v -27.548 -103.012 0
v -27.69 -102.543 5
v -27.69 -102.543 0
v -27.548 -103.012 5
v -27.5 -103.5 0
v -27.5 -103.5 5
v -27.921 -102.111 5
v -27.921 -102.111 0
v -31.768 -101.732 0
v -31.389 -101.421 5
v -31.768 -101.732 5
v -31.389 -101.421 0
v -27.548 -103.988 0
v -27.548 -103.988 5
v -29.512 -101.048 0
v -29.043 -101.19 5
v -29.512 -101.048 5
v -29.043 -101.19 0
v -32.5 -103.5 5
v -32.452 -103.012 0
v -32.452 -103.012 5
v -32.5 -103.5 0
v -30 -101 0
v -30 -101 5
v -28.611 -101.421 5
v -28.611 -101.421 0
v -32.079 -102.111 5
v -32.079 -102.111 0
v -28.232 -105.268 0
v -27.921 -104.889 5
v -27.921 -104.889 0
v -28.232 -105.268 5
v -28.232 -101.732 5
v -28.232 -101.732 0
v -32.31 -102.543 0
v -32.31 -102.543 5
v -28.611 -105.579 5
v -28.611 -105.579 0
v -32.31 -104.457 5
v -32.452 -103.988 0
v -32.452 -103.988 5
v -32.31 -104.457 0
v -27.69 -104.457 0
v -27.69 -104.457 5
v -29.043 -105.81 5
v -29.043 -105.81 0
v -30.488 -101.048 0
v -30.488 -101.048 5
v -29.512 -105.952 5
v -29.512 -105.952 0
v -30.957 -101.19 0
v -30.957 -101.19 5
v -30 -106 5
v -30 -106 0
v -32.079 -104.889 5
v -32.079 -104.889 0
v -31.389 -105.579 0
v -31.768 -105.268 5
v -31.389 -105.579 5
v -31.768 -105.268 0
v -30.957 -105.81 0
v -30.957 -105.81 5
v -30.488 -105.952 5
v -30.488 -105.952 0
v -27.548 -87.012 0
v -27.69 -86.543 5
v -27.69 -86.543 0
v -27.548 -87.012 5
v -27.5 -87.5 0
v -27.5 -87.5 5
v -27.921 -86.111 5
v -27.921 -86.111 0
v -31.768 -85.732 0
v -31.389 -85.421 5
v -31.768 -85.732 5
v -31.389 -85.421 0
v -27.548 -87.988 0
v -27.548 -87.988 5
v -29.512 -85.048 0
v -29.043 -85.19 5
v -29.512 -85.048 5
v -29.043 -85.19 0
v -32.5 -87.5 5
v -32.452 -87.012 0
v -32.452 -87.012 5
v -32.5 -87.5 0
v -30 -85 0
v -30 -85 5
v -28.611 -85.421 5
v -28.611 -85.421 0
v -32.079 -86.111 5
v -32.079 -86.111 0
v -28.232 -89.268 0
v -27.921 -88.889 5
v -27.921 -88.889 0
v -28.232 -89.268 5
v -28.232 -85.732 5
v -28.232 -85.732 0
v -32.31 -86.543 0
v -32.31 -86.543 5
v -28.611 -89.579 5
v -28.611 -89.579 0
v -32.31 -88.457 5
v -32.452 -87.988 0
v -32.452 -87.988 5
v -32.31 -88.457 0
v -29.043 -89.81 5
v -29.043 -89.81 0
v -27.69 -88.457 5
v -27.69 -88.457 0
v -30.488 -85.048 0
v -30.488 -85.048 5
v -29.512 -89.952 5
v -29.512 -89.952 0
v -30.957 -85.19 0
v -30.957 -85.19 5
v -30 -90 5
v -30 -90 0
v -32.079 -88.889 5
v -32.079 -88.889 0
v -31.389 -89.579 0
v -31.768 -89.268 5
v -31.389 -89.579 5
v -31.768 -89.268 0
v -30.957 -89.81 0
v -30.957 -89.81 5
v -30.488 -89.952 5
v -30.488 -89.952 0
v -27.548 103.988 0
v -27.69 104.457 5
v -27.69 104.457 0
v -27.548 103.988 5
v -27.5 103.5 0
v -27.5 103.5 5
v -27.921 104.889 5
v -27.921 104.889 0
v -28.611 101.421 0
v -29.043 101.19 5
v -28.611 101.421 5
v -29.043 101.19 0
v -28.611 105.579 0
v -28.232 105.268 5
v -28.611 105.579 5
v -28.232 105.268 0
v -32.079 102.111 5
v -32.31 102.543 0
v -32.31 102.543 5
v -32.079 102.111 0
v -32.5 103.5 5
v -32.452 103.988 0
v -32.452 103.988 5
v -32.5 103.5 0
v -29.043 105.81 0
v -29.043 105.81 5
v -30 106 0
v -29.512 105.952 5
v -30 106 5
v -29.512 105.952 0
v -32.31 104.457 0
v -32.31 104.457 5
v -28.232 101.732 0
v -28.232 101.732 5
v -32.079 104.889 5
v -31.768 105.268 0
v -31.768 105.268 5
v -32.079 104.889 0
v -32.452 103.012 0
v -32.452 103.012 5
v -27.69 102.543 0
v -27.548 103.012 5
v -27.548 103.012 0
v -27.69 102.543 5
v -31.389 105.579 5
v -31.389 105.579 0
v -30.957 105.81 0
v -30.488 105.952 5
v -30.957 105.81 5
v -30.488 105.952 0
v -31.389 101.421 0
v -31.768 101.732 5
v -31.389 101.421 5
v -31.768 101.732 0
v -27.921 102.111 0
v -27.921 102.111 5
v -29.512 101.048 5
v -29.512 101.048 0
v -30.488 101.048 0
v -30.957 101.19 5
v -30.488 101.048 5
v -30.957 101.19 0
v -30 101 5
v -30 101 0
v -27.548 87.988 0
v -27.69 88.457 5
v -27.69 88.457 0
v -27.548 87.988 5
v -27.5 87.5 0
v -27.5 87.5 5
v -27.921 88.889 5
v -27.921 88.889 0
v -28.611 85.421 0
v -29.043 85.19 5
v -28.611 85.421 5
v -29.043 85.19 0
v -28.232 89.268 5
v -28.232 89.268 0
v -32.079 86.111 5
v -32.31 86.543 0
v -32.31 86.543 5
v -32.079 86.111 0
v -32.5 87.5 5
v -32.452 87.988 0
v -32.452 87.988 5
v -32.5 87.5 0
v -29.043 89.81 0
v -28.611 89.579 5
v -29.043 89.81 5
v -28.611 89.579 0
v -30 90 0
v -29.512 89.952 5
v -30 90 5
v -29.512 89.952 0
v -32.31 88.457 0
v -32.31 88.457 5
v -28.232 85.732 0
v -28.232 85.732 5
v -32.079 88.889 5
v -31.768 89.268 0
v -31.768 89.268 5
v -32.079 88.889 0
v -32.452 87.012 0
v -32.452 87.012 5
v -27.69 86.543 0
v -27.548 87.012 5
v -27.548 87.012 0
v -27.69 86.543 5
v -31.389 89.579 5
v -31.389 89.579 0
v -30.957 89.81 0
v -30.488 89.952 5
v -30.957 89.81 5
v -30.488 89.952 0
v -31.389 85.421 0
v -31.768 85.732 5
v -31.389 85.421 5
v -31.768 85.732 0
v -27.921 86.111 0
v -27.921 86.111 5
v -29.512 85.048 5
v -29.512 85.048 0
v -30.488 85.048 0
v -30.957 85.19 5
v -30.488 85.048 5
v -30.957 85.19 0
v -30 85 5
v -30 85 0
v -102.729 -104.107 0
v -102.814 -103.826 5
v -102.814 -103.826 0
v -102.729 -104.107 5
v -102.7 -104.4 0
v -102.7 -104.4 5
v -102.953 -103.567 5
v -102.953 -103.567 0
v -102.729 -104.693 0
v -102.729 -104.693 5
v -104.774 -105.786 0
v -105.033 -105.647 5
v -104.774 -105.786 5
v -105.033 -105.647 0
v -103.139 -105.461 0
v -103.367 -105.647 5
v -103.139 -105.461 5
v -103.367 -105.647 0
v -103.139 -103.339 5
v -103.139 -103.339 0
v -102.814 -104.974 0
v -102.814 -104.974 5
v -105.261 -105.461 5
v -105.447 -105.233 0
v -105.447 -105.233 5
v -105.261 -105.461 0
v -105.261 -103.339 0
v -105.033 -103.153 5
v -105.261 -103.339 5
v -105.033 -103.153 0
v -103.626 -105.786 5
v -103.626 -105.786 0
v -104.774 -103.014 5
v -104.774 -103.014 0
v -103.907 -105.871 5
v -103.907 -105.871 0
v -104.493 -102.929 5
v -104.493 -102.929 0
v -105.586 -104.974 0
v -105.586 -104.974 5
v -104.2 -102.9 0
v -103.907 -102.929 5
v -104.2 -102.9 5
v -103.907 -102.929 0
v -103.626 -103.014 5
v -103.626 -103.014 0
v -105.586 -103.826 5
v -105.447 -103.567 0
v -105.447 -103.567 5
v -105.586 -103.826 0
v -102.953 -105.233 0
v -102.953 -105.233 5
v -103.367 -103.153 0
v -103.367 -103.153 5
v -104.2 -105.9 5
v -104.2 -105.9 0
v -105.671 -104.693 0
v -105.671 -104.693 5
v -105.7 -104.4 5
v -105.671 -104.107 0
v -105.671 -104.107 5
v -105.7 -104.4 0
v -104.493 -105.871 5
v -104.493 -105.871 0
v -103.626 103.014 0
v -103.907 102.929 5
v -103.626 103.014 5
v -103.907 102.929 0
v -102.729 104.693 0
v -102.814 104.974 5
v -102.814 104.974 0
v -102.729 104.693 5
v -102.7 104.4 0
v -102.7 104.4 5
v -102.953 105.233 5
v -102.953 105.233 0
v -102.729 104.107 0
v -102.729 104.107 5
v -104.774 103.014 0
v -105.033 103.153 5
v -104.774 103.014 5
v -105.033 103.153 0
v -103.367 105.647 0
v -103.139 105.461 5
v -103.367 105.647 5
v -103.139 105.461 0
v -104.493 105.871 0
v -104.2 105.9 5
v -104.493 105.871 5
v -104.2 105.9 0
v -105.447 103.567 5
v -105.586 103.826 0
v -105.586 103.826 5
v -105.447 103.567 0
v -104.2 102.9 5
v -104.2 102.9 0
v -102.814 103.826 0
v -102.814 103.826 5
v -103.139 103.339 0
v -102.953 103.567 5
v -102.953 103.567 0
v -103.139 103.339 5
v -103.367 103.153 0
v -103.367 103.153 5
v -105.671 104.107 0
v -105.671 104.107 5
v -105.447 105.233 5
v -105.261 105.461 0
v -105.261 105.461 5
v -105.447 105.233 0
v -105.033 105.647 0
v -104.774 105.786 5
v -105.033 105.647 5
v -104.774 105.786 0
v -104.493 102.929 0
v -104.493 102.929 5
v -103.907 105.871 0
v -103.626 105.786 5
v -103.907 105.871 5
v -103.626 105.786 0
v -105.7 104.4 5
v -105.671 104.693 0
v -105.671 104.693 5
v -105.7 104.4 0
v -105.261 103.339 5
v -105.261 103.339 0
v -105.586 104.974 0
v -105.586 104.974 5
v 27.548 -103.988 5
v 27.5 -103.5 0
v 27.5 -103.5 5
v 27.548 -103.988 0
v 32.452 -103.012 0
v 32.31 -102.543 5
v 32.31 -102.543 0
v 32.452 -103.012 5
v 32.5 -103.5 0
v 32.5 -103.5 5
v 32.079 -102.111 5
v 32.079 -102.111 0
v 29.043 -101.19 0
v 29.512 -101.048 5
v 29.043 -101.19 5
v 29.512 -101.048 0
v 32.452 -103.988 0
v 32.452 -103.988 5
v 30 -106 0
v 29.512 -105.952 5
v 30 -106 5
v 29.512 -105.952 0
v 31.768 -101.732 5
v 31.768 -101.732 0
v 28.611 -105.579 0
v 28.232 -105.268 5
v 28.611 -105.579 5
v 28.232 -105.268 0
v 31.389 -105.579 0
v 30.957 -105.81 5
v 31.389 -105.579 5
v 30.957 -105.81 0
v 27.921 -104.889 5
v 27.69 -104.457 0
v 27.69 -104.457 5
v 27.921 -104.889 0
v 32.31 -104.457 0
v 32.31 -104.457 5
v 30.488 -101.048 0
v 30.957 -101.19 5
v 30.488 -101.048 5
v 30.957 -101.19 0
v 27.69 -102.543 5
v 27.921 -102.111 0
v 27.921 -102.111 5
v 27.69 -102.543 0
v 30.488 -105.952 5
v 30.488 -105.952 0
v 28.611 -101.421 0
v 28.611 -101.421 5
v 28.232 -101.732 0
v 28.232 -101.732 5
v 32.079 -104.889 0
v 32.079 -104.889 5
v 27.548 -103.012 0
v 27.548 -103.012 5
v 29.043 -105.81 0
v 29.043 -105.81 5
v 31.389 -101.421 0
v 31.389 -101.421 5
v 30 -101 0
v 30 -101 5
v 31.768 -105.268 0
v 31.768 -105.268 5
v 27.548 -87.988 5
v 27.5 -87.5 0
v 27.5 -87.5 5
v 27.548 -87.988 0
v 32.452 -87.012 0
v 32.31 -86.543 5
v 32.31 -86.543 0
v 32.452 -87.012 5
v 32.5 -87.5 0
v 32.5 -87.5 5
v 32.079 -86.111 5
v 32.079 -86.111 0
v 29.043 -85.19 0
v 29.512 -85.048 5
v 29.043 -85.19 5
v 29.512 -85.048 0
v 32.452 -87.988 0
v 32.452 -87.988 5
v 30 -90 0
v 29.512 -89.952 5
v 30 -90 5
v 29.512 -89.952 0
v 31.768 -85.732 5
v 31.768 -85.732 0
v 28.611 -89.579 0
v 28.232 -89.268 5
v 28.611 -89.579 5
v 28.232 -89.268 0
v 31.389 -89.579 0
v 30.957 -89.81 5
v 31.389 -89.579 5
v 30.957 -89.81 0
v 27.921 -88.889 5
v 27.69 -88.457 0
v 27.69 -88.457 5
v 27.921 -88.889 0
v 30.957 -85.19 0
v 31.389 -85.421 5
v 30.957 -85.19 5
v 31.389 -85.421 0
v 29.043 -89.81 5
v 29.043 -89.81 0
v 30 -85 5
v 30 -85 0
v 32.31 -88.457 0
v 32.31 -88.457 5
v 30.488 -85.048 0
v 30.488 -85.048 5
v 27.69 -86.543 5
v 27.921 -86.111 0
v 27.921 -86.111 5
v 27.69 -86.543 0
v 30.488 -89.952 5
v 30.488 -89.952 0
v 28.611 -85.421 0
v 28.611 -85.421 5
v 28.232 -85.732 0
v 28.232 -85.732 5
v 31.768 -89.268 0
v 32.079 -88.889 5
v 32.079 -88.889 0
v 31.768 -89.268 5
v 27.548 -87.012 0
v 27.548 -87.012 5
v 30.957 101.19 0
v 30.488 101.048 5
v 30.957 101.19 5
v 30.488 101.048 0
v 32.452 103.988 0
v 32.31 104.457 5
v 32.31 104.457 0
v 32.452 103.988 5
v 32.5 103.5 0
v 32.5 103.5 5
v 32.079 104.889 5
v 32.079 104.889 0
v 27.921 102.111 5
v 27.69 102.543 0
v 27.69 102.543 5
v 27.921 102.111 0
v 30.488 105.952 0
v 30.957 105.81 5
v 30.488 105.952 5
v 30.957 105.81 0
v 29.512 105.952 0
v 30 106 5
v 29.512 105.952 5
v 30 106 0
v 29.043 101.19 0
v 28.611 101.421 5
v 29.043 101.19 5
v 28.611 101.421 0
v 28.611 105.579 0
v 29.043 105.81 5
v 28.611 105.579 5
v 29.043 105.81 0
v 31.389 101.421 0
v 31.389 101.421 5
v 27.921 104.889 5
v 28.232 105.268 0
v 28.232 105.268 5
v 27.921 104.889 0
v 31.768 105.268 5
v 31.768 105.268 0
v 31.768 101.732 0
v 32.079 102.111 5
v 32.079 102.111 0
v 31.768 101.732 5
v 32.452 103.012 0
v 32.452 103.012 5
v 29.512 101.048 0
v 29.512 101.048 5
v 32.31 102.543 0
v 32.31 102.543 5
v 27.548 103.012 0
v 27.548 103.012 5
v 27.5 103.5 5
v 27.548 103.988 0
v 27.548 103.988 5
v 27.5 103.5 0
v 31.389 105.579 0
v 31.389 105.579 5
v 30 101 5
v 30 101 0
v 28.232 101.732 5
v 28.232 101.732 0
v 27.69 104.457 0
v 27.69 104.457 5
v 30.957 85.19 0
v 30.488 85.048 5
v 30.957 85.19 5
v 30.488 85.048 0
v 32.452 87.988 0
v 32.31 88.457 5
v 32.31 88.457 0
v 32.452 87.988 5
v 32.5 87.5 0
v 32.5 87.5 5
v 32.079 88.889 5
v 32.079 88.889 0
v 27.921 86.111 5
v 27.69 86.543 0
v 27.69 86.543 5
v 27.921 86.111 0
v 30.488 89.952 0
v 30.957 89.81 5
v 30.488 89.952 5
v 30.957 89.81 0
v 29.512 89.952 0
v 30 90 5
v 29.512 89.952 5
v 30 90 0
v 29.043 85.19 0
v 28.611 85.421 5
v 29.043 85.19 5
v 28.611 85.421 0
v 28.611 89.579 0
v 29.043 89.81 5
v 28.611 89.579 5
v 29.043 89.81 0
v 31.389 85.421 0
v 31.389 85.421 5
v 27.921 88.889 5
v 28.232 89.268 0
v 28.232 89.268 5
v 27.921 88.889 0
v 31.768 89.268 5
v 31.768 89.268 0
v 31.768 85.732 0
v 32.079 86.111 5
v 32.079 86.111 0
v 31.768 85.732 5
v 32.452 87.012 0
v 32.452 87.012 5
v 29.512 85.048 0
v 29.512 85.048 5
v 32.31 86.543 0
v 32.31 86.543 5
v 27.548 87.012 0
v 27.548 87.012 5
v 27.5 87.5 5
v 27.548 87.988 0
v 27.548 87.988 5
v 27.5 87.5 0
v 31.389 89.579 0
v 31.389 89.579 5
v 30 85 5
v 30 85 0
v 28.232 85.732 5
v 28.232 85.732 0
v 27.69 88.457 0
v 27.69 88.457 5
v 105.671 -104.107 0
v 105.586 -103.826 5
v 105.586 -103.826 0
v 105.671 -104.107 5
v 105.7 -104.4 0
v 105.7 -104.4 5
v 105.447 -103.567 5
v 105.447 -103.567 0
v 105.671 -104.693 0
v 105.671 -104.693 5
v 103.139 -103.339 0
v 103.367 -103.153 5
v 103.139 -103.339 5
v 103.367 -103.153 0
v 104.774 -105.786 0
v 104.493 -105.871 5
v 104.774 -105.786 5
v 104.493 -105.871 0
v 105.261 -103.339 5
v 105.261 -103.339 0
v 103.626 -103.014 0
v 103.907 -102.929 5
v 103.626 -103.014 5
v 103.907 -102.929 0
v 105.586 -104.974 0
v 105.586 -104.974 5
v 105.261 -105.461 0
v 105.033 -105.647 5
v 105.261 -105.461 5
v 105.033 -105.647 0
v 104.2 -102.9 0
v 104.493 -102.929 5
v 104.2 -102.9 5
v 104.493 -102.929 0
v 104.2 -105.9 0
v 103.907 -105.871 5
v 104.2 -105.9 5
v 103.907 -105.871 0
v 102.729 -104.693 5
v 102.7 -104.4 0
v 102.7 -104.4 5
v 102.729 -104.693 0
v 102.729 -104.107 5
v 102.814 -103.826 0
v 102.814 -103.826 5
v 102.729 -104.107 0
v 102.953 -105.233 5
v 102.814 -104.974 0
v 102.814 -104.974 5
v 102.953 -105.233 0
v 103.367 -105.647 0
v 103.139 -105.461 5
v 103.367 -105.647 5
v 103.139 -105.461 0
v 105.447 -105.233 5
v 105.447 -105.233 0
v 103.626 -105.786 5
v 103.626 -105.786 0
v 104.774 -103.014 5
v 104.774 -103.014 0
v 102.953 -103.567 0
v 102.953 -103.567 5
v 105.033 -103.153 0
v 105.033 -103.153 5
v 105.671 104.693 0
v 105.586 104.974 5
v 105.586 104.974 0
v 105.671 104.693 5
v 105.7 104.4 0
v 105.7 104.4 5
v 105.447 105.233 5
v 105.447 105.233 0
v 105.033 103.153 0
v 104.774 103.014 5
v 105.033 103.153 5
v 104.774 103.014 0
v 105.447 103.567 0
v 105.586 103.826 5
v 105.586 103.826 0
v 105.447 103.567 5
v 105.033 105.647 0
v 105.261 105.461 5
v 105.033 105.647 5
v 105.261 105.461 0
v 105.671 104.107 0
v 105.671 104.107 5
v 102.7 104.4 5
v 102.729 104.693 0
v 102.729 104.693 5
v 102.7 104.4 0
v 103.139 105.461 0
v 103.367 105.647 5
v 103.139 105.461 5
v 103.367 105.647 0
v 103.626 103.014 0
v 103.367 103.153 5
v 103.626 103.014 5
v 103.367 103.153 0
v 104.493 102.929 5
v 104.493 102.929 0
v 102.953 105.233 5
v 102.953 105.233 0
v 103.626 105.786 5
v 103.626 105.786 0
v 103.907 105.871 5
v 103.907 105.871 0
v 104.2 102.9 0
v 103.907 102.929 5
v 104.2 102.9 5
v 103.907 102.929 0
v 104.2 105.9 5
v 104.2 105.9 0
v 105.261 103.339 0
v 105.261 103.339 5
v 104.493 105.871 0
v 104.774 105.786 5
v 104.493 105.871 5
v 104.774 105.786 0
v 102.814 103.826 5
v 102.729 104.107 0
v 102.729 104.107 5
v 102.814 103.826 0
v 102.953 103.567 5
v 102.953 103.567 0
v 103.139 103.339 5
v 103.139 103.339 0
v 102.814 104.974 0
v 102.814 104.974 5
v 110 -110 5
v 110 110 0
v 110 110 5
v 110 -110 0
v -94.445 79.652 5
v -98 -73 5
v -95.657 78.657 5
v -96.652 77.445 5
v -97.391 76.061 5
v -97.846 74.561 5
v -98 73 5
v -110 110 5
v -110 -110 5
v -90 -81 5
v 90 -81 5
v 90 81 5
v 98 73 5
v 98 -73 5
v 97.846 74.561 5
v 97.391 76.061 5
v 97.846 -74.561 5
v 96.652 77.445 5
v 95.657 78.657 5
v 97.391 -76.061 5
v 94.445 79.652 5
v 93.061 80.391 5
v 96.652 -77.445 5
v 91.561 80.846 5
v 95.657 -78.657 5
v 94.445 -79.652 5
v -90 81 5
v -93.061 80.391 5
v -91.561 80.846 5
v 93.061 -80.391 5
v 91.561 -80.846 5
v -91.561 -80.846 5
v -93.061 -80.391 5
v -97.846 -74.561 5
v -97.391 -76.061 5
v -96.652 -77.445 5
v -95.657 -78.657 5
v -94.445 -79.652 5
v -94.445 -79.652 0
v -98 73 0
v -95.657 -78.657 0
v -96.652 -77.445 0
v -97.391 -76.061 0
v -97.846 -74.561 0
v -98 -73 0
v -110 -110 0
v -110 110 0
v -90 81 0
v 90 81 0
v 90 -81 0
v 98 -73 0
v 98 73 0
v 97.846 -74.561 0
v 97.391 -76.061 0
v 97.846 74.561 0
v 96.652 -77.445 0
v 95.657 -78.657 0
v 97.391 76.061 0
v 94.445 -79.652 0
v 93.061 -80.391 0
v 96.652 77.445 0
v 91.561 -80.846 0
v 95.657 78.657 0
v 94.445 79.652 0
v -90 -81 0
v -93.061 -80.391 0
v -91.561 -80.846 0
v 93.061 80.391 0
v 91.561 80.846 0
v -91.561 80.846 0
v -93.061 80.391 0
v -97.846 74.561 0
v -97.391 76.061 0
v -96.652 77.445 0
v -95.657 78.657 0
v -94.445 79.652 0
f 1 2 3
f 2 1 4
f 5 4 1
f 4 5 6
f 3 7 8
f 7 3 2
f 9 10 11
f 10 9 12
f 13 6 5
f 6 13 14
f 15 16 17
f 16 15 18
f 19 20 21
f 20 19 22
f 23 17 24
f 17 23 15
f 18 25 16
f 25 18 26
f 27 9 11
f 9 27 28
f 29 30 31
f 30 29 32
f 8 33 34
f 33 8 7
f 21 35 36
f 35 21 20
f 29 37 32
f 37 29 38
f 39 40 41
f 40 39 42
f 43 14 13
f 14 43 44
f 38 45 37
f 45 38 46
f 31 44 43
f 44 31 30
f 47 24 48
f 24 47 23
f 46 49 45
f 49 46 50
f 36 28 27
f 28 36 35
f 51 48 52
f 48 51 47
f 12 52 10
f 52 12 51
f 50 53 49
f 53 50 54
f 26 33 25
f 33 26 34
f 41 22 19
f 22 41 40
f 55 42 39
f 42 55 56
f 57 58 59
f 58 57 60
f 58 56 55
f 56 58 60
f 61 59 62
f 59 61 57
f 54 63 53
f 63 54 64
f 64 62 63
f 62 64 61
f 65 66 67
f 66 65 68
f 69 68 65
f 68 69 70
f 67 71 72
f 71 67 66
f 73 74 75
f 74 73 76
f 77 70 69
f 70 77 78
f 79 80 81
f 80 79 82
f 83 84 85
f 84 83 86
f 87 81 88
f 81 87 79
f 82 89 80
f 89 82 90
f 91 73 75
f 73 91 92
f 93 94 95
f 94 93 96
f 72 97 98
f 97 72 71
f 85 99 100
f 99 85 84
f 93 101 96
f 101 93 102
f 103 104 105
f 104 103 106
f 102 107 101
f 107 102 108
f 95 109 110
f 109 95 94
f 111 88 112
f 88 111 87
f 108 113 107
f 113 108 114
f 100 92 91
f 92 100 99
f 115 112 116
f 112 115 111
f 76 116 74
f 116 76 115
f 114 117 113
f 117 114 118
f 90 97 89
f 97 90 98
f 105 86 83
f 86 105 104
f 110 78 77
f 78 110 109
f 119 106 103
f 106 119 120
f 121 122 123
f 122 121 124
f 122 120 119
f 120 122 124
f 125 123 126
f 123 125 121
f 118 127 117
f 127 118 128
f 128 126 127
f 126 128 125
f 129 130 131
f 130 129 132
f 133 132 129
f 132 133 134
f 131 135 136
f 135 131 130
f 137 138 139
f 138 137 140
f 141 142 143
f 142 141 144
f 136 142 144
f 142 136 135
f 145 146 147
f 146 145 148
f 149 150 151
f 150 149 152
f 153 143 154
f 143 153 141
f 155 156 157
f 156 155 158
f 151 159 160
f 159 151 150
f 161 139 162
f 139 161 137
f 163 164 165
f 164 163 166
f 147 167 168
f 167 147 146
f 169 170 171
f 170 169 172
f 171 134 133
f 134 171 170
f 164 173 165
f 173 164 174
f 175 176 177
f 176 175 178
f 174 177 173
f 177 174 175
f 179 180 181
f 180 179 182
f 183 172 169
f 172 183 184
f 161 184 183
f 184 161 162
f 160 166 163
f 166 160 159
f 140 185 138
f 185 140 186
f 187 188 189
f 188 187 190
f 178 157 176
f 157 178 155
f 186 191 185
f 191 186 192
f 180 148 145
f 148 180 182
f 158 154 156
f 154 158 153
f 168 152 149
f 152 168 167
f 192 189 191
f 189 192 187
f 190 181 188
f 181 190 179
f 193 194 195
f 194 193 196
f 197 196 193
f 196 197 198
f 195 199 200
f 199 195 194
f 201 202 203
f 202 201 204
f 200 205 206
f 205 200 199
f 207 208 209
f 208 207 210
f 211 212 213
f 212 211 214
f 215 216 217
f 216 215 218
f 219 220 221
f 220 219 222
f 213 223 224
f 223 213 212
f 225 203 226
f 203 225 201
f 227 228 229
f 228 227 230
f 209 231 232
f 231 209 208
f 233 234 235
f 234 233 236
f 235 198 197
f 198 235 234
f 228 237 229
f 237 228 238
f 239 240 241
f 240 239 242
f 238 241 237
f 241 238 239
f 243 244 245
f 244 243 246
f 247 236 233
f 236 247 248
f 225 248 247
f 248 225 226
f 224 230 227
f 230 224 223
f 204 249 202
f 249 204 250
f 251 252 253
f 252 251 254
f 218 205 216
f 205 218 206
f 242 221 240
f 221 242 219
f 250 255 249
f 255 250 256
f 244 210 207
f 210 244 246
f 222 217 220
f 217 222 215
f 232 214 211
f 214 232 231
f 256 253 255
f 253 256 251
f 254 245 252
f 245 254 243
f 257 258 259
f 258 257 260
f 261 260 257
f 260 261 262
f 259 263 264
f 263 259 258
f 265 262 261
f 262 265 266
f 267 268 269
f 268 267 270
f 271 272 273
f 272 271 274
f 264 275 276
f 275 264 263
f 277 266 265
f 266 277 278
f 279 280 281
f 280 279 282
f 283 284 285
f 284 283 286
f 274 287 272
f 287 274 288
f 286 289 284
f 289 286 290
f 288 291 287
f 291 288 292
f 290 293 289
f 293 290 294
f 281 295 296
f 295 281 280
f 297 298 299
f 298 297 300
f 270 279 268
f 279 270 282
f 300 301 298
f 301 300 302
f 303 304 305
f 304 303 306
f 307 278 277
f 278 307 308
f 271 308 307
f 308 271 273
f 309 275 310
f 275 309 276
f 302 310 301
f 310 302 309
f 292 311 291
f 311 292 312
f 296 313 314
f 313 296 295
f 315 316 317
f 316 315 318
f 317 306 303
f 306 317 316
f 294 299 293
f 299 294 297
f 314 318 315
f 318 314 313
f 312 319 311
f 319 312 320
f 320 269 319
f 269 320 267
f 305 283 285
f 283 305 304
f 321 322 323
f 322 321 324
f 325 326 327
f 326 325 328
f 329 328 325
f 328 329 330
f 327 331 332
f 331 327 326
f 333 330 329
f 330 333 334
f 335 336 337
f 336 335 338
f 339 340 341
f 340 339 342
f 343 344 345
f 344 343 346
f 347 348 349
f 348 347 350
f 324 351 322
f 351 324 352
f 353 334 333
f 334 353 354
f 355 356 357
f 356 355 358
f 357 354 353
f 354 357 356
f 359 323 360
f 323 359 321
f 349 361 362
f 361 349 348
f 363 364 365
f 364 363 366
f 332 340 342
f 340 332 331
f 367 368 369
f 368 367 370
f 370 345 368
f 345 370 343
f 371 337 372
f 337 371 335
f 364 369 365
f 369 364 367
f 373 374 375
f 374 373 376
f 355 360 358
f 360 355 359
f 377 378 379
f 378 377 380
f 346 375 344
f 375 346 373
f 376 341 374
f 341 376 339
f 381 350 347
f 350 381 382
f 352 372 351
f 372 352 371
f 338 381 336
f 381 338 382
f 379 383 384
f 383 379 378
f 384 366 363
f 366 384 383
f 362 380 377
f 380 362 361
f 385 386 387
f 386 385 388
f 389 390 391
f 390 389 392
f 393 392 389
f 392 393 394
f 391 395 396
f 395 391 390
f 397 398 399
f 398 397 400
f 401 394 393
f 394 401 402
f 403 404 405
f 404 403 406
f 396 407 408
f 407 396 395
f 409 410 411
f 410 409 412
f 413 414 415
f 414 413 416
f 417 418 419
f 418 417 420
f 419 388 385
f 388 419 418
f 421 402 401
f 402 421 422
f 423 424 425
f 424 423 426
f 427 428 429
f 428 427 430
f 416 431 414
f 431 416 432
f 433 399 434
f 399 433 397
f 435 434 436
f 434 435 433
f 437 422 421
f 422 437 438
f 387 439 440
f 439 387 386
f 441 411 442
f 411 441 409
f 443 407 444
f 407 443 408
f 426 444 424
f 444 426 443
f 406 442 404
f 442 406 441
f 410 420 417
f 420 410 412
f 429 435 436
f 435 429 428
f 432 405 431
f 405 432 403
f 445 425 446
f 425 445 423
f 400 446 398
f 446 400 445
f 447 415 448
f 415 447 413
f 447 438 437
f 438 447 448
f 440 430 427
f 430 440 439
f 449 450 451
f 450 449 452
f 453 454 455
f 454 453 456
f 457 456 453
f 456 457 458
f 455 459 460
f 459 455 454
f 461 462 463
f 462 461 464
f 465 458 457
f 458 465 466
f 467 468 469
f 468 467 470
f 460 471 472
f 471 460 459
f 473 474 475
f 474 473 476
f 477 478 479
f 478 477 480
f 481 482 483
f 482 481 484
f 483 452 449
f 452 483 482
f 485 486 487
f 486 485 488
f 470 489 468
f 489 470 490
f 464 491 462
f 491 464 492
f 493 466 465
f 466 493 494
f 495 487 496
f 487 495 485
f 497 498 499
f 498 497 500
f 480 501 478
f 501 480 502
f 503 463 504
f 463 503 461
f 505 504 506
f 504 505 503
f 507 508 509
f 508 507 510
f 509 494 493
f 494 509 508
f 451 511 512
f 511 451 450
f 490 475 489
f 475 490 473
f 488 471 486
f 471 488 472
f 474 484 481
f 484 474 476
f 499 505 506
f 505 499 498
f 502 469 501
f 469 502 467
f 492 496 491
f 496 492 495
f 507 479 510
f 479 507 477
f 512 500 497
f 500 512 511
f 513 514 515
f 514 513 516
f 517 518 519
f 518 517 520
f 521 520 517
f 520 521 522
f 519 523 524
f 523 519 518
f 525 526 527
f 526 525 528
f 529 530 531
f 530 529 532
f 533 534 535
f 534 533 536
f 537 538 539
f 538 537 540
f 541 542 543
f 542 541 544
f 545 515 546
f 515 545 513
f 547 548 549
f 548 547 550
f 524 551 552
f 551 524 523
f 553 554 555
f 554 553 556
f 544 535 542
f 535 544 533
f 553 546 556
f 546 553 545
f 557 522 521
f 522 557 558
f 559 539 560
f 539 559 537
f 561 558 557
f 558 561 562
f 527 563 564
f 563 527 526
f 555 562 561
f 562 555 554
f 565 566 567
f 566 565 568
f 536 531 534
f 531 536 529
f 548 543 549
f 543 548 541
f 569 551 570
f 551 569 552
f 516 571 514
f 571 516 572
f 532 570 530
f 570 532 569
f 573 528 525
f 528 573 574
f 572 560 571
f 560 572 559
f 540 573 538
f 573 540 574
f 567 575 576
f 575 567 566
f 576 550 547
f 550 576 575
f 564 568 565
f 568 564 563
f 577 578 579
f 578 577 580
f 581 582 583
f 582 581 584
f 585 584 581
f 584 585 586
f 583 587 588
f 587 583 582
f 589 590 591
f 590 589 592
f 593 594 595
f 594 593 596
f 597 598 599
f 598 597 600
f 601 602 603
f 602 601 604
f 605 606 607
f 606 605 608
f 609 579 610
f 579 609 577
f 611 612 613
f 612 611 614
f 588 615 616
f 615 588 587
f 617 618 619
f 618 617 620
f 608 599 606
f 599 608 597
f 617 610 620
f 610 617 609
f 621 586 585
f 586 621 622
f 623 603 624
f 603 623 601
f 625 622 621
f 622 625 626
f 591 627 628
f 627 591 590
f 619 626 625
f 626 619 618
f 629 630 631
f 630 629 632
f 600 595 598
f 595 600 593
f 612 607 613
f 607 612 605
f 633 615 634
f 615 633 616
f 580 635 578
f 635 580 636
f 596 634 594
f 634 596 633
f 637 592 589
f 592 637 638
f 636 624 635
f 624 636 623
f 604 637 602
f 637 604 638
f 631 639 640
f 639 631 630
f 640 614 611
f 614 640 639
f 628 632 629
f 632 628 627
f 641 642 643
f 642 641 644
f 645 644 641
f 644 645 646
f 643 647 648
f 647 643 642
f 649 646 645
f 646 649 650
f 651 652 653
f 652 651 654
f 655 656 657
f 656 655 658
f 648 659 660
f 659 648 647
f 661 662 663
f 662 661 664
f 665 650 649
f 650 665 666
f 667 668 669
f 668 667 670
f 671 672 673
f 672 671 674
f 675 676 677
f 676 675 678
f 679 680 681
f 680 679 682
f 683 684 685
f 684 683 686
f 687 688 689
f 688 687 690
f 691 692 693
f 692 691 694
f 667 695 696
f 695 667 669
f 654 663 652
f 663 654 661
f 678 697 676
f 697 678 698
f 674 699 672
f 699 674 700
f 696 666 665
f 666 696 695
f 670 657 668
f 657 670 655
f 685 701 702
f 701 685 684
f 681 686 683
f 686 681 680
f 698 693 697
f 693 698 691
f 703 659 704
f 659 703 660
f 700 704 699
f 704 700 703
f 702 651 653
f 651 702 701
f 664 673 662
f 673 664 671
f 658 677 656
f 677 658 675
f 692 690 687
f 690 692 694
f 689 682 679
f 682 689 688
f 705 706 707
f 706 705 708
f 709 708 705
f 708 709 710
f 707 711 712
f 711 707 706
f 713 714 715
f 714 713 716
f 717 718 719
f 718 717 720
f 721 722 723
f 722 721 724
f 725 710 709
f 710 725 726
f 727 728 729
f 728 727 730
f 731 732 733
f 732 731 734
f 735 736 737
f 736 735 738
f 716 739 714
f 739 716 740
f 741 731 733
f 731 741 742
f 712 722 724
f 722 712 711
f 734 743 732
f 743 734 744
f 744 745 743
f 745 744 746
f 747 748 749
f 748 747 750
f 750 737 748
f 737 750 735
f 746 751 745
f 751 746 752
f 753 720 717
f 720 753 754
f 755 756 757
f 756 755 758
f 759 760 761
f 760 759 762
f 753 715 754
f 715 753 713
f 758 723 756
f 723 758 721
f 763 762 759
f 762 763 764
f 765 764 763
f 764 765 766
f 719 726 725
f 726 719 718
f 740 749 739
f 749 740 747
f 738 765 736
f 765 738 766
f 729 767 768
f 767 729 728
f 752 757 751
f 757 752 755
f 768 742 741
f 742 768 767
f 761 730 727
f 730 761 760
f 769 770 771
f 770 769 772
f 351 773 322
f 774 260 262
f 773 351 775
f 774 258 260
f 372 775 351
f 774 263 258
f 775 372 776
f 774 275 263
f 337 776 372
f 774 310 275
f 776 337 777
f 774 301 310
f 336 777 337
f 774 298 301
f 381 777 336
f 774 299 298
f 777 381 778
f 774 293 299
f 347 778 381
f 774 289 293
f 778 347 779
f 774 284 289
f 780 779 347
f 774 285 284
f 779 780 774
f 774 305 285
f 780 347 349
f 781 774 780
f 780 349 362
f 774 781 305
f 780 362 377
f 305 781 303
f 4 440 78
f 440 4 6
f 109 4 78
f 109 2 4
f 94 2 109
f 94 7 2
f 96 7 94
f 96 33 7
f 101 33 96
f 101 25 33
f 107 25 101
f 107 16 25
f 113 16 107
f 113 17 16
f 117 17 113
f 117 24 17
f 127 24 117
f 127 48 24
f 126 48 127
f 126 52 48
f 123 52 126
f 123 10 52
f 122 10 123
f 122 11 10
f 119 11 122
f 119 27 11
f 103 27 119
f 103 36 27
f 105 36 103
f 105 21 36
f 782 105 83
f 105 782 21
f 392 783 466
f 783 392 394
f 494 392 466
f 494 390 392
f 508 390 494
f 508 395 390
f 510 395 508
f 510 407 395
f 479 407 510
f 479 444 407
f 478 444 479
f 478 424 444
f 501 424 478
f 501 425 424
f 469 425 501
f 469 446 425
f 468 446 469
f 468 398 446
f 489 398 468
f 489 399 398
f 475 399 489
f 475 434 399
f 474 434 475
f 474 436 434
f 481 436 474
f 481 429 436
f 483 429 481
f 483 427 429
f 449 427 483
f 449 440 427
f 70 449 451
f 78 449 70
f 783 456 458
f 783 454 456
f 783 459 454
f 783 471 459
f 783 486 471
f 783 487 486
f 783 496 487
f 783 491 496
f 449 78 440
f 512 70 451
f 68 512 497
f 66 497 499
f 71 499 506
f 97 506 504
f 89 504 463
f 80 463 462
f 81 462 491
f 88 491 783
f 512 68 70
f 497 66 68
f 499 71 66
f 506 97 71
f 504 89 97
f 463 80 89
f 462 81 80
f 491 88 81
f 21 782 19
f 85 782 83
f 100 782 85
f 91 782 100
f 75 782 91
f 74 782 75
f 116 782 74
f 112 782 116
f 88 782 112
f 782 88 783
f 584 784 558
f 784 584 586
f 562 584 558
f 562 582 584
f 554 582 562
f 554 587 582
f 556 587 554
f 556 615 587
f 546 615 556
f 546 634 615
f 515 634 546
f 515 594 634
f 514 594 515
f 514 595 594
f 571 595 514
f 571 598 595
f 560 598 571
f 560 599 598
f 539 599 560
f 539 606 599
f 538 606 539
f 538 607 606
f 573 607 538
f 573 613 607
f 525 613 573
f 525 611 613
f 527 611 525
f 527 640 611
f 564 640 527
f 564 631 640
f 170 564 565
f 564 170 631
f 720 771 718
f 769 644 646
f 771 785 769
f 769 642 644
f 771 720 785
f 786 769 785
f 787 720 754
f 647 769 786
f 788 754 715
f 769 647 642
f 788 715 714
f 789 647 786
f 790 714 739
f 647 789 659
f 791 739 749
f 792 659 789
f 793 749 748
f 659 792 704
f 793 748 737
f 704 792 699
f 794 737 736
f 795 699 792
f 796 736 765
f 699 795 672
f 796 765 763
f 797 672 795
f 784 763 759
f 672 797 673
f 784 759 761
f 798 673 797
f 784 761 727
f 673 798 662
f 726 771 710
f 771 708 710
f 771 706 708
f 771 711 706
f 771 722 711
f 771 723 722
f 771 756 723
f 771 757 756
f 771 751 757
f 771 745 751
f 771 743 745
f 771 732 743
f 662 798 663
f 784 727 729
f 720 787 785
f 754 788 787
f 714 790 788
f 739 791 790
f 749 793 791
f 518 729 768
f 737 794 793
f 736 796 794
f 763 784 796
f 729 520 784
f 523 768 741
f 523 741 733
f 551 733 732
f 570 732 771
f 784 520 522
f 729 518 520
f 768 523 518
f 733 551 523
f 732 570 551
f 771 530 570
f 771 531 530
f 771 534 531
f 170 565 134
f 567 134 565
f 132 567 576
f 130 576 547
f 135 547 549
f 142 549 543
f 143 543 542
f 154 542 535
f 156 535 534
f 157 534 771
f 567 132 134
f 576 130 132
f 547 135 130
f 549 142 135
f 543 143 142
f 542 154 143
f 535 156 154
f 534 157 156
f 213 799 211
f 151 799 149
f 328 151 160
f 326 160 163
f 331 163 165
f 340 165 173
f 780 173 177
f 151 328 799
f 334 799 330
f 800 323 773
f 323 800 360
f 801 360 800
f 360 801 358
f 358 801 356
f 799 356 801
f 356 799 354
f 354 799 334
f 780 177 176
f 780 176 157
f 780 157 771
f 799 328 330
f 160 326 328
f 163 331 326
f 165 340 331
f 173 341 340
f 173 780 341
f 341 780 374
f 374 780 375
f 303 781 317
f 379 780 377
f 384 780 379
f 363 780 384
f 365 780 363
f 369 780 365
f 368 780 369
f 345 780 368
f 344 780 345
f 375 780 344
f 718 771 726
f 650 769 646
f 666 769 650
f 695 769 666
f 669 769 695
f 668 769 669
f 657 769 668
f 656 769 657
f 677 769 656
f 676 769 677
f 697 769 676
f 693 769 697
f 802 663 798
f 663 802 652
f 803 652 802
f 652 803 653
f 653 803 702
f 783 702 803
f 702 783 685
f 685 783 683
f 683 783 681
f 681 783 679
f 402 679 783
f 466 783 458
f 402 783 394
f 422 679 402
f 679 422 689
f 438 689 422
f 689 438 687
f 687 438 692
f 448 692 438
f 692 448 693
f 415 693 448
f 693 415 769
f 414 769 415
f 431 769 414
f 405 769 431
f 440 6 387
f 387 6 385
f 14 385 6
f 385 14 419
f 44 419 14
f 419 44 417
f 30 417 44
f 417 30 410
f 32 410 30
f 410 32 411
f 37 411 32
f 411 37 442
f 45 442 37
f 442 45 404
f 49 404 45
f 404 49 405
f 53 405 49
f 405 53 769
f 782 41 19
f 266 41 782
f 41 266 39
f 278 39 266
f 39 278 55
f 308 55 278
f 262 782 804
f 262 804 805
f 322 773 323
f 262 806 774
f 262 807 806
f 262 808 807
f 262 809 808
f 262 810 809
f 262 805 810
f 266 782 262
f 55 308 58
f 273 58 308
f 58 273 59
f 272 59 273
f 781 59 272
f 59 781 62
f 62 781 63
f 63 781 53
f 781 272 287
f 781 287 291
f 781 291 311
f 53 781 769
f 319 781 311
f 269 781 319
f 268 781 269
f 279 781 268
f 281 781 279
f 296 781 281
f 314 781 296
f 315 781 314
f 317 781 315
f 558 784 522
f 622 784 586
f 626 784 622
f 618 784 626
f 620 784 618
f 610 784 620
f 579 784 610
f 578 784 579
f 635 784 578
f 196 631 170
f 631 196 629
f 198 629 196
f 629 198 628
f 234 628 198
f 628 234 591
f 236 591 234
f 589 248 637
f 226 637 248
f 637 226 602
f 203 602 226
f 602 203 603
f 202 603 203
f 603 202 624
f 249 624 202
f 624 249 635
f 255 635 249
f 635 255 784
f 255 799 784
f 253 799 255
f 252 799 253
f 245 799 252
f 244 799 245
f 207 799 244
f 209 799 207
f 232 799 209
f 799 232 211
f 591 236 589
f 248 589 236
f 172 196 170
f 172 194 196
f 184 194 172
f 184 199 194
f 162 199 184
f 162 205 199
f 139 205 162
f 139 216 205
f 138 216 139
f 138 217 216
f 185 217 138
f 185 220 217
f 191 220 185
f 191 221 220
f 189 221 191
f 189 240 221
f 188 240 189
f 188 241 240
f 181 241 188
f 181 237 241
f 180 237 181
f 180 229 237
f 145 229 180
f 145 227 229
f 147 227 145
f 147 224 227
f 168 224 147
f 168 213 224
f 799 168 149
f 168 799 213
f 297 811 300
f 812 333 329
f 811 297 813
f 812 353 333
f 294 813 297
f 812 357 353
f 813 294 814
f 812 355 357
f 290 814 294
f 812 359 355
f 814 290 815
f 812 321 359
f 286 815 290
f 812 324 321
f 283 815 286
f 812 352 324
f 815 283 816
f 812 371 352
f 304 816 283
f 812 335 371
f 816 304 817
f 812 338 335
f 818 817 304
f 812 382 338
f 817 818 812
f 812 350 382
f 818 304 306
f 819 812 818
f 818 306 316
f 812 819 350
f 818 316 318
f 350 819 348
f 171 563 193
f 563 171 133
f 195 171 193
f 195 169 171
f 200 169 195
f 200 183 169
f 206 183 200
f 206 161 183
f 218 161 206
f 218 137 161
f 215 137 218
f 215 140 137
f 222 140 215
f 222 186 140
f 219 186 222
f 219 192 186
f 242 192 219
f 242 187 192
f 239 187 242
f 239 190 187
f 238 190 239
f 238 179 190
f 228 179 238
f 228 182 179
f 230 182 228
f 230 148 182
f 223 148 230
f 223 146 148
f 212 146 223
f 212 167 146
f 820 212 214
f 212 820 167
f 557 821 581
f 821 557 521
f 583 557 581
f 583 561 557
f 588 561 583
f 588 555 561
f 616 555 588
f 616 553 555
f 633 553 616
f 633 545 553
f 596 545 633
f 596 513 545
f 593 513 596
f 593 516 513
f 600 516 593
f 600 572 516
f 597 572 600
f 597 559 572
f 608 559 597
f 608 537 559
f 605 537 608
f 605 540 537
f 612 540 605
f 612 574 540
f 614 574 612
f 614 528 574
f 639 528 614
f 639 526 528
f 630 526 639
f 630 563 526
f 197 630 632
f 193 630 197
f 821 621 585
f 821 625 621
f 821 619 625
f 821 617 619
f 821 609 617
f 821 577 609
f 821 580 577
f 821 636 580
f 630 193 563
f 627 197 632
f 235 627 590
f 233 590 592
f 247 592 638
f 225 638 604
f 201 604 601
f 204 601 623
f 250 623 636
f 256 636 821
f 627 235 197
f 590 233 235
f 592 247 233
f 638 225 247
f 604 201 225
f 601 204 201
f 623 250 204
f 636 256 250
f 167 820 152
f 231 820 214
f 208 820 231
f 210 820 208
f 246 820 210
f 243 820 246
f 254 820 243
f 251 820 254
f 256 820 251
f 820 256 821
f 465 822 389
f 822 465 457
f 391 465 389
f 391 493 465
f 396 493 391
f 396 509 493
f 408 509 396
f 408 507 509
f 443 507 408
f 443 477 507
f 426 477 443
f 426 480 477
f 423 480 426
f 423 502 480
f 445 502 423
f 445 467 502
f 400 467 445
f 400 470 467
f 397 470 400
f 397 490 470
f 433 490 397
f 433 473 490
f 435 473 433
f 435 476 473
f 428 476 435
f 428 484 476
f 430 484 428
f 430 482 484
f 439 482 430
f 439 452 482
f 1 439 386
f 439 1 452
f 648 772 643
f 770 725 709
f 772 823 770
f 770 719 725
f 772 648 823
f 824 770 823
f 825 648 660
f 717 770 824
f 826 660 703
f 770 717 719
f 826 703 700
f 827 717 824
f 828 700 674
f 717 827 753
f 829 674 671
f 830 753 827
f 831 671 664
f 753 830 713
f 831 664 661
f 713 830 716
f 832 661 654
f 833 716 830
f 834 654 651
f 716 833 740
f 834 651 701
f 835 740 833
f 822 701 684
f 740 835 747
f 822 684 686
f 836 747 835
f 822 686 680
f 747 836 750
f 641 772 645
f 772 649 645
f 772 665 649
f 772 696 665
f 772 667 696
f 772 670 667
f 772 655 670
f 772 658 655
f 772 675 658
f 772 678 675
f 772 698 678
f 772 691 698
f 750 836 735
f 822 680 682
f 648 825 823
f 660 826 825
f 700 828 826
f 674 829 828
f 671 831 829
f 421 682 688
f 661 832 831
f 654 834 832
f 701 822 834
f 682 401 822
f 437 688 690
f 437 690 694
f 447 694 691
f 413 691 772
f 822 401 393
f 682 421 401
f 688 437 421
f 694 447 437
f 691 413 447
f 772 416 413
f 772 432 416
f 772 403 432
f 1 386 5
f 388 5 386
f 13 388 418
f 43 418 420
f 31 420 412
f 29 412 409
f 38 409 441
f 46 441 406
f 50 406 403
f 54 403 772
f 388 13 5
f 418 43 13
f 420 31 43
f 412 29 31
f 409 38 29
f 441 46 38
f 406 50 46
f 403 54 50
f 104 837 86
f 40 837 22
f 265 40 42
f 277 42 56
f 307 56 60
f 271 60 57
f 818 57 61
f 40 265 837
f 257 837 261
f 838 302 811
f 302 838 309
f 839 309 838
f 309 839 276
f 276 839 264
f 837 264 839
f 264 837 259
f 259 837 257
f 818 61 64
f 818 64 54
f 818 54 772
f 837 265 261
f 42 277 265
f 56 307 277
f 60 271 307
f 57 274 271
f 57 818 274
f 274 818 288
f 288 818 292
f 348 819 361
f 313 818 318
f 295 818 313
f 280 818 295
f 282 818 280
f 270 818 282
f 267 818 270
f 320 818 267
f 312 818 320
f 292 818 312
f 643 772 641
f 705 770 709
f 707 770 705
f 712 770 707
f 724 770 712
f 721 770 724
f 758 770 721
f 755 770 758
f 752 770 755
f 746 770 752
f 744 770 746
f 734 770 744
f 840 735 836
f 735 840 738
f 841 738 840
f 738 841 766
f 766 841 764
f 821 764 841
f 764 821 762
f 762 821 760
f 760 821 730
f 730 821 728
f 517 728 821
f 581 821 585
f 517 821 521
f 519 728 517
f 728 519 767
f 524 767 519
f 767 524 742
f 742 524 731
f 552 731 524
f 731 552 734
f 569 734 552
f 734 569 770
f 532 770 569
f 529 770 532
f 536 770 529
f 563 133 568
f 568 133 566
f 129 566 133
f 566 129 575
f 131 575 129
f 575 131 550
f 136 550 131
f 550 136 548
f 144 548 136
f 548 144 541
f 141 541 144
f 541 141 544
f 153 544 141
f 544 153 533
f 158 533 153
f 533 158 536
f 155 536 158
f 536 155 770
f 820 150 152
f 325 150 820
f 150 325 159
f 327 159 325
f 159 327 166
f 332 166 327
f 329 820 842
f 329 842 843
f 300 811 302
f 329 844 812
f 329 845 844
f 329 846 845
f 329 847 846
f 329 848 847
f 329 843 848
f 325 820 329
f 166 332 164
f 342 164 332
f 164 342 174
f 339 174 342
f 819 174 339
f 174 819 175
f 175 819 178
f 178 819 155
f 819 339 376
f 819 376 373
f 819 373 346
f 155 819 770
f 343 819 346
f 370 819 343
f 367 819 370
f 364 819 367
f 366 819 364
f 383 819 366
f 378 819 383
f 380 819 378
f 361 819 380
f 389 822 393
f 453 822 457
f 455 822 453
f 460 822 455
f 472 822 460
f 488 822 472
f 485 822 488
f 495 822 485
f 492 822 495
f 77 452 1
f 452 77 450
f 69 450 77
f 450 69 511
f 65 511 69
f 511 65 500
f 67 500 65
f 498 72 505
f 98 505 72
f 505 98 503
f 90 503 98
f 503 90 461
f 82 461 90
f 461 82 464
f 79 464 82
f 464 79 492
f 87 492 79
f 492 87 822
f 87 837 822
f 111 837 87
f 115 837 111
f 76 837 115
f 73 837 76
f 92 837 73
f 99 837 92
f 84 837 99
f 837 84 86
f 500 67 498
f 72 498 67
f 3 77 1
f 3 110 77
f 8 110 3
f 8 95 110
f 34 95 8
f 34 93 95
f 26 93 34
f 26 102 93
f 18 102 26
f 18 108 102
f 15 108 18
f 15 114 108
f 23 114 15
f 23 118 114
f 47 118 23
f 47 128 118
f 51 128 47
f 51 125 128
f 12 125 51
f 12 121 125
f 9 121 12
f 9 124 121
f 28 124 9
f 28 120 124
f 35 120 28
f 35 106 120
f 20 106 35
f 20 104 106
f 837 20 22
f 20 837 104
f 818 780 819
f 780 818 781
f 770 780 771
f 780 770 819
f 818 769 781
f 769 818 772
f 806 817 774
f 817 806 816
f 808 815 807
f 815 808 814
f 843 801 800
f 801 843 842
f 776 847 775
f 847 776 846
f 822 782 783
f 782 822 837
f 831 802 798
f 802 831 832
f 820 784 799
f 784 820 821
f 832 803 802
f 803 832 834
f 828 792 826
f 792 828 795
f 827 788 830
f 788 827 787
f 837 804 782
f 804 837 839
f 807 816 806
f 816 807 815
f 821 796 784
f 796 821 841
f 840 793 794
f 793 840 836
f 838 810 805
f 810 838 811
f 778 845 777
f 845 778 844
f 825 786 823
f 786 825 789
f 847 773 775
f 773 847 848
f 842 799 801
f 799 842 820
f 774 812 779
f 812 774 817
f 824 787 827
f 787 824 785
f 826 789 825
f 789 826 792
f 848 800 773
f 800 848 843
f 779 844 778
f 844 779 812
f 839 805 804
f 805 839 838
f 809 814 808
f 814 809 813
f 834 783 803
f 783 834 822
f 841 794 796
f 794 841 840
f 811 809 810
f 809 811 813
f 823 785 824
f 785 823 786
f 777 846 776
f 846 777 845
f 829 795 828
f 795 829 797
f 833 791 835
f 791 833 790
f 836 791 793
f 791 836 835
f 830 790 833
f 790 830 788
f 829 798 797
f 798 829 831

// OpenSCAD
// file: Profiles.scad
module profileI5(l) {
    color("Silver") render(convexity=8) linear_extrude(height=l, convexity=8) {
        difference() {
            union() {
                for(i=[-1, 1]) {
                    for(j=[-1, 1]) {
                        translate([i*8, j*8, 0]) circle(d=4, $fn=12);
                        translate([i*(10-1.58/2), j*(2.5+5.5/2), 0]) square([1.58, 5.5], center=true);
                        translate([i*(2.5+5.5/2), j*(10-1.58/2), 0]) square([5.5, 1.58], center=true);
                        translate([i*(5.55+1.5/2), j*(10-1.58-1.5/3), 0]) square([1.5, 1.5], center=true);
                        translate([i*(10-1.58-1.5/3), j*(5.55+1.5/2), 0]) square([1.5, 1.5], center=true);
                    }
                    rotate([0, 0, i*45]) square([20, 1.5], center=true);
                }
                square([2*(10-6.35), 2*(10-6.35)], center=true);
            }
            circle(d=4.3, $fn=16);
            for(i=[-1, 1]) {
                for(j=[-1, 1]) {
                    translate([i*5.55, j*(10-1.58-1.5/2), 0]) circle(d=1.5, $fn=8);
                    translate([i*(10-1.58-1.5/2), j*5.55, 0]) circle(d=1.5, $fn=8);
                }
            }
        }
    }
}

module profileI5double(l) {
    color("Silver") render(convexity=8) linear_extrude(height=l, convexity=8) {
        difference() {
            union() {
                for(i=[-1, 1]) {
                    for(j=[-1, 1]) {
                        translate([i*8, j*18+10, 0]) circle(d=4, $fn=12);
                        translate([i*(10-1.58/2), j*(2.5+5.5/2), 0]) square([1.58, 5.5], center=true);
                        translate([i*(10-1.58/2), j*(2.5+5.5/2)+20, 0]) square([1.58, 5.5], center=true);
                        translate([i*(2.5+5.5/2), j*(20-1.58/2)+10, 0]) square([5.5, 1.58], center=true);
                        translate([i*(5.55+1.5/2), j*(20-1.58-1.5/3)+10, 0]) square([1.5, 1.5], center=true);
                        translate([i*(10-1.58-1.5/3), j*(5.55+1.5/2), 0]) square([1.5, 1.5], center=true);
                        translate([i*(10-1.58-1.5/3), j*(5.55+1.5/2)+20, 0]) square([1.5, 1.5], center=true);
                        translate([0, j*10+10, 0]) rotate([0, 0, i*45]) square([26, 1.5], center=true);
                        translate([0, j*10+10, 0]) square([2*(10-6.35), 2*(10-6.35)], center=true);
                        translate([i*8.5, j*2.5+10, 0]) square([2, 2], center=true);
                    }
                    translate([i*9.2, 10, 0]) square([1.6, 7], center=true);
                }
                
            }
            for(i=[-1, 1]) {
                translate([0, i*10+10, 0]) circle(d=4.3, $fn=16);
                translate([i*7.883, 10, 0]) circle(d=1.5, $fn=16);
                for(j=[-1, 1]) {
                    for(k=[0, 20]) {
                        translate([i*5.55, j*(10-1.58-1.5/2)+k, 0]) circle(d=1.5, $fn=8);
                        translate([i*(10-1.58-1.5/2), j*5.55+k, 0]) circle(d=1.5, $fn=8);
                    }
                }
            }
        }
    }
}

module DrylinWS4010(l) {
    color("Silver") render(convexity=8) linear_extrude(height=l, convexity=8) {
        for(i=[-1, 1]) {
            translate([i*20, 9, 0]) circle(d=10, $fn=48);
            translate([i*16.5, 3.5, 0]) rotate([0, 0, i*20]) square([5, 5], center=true);
        }
        translate([0, 5.5/2, 0]) square([40, 5.5], center=true);
    }
}

module Drylin10slider() {
    color("Silver") render(convexity=4) difference() {
        translate([30+6.5-26, 2, 0]) cube([26, 16, 29]);
        translate([20, 9, -1]) cylinder(d=10.1, h=31, $fn=48);
        for(i=[-1, 1]) {
            translate([30, 19, 29/2+i*8]) rotate([90, 0, 0]) cylinder(d=5, h=18, $fn=32);
        }
        translate([-5.5, -8, -1]) cube([26, 16, 31]);
    }
}

Drylin10slider();
DrylinWS4010(30);
//profileI5double(15);
//translate([0, 0, -5]) profileI5(4);
//translate([0, 20, -5]) profileI5(5);
// main file
use <Profiles.scad>
res=32;

module bed_support() {
    difference() {
        translate([0, 0, 2.5]) cube([220, 220, 5], center=true);
        for(i=[-1, 1]) {
            for(j=[-1, 1]) {
                translate([i*208.4/2, j*208.8/2, -1]) cylinder(d=3, h=7, $fn=res);
                for(k=[0, 1]) {
                    translate([i*60/2, j*(220/2-(29-16)/2)+j*k*-16, -1]) cylinder(d=5, h=7, $fn=res);
                }
            }
        }
        hull() {
            for(i=[-1, 1]) {
                for(j=[-1, 1]) {
                    translate([i*180/2, j*(220/2-29-8), -1]) cylinder(d=16, h=7, $fn=res);
                }
            }
        }
    }
}
bed_support();
